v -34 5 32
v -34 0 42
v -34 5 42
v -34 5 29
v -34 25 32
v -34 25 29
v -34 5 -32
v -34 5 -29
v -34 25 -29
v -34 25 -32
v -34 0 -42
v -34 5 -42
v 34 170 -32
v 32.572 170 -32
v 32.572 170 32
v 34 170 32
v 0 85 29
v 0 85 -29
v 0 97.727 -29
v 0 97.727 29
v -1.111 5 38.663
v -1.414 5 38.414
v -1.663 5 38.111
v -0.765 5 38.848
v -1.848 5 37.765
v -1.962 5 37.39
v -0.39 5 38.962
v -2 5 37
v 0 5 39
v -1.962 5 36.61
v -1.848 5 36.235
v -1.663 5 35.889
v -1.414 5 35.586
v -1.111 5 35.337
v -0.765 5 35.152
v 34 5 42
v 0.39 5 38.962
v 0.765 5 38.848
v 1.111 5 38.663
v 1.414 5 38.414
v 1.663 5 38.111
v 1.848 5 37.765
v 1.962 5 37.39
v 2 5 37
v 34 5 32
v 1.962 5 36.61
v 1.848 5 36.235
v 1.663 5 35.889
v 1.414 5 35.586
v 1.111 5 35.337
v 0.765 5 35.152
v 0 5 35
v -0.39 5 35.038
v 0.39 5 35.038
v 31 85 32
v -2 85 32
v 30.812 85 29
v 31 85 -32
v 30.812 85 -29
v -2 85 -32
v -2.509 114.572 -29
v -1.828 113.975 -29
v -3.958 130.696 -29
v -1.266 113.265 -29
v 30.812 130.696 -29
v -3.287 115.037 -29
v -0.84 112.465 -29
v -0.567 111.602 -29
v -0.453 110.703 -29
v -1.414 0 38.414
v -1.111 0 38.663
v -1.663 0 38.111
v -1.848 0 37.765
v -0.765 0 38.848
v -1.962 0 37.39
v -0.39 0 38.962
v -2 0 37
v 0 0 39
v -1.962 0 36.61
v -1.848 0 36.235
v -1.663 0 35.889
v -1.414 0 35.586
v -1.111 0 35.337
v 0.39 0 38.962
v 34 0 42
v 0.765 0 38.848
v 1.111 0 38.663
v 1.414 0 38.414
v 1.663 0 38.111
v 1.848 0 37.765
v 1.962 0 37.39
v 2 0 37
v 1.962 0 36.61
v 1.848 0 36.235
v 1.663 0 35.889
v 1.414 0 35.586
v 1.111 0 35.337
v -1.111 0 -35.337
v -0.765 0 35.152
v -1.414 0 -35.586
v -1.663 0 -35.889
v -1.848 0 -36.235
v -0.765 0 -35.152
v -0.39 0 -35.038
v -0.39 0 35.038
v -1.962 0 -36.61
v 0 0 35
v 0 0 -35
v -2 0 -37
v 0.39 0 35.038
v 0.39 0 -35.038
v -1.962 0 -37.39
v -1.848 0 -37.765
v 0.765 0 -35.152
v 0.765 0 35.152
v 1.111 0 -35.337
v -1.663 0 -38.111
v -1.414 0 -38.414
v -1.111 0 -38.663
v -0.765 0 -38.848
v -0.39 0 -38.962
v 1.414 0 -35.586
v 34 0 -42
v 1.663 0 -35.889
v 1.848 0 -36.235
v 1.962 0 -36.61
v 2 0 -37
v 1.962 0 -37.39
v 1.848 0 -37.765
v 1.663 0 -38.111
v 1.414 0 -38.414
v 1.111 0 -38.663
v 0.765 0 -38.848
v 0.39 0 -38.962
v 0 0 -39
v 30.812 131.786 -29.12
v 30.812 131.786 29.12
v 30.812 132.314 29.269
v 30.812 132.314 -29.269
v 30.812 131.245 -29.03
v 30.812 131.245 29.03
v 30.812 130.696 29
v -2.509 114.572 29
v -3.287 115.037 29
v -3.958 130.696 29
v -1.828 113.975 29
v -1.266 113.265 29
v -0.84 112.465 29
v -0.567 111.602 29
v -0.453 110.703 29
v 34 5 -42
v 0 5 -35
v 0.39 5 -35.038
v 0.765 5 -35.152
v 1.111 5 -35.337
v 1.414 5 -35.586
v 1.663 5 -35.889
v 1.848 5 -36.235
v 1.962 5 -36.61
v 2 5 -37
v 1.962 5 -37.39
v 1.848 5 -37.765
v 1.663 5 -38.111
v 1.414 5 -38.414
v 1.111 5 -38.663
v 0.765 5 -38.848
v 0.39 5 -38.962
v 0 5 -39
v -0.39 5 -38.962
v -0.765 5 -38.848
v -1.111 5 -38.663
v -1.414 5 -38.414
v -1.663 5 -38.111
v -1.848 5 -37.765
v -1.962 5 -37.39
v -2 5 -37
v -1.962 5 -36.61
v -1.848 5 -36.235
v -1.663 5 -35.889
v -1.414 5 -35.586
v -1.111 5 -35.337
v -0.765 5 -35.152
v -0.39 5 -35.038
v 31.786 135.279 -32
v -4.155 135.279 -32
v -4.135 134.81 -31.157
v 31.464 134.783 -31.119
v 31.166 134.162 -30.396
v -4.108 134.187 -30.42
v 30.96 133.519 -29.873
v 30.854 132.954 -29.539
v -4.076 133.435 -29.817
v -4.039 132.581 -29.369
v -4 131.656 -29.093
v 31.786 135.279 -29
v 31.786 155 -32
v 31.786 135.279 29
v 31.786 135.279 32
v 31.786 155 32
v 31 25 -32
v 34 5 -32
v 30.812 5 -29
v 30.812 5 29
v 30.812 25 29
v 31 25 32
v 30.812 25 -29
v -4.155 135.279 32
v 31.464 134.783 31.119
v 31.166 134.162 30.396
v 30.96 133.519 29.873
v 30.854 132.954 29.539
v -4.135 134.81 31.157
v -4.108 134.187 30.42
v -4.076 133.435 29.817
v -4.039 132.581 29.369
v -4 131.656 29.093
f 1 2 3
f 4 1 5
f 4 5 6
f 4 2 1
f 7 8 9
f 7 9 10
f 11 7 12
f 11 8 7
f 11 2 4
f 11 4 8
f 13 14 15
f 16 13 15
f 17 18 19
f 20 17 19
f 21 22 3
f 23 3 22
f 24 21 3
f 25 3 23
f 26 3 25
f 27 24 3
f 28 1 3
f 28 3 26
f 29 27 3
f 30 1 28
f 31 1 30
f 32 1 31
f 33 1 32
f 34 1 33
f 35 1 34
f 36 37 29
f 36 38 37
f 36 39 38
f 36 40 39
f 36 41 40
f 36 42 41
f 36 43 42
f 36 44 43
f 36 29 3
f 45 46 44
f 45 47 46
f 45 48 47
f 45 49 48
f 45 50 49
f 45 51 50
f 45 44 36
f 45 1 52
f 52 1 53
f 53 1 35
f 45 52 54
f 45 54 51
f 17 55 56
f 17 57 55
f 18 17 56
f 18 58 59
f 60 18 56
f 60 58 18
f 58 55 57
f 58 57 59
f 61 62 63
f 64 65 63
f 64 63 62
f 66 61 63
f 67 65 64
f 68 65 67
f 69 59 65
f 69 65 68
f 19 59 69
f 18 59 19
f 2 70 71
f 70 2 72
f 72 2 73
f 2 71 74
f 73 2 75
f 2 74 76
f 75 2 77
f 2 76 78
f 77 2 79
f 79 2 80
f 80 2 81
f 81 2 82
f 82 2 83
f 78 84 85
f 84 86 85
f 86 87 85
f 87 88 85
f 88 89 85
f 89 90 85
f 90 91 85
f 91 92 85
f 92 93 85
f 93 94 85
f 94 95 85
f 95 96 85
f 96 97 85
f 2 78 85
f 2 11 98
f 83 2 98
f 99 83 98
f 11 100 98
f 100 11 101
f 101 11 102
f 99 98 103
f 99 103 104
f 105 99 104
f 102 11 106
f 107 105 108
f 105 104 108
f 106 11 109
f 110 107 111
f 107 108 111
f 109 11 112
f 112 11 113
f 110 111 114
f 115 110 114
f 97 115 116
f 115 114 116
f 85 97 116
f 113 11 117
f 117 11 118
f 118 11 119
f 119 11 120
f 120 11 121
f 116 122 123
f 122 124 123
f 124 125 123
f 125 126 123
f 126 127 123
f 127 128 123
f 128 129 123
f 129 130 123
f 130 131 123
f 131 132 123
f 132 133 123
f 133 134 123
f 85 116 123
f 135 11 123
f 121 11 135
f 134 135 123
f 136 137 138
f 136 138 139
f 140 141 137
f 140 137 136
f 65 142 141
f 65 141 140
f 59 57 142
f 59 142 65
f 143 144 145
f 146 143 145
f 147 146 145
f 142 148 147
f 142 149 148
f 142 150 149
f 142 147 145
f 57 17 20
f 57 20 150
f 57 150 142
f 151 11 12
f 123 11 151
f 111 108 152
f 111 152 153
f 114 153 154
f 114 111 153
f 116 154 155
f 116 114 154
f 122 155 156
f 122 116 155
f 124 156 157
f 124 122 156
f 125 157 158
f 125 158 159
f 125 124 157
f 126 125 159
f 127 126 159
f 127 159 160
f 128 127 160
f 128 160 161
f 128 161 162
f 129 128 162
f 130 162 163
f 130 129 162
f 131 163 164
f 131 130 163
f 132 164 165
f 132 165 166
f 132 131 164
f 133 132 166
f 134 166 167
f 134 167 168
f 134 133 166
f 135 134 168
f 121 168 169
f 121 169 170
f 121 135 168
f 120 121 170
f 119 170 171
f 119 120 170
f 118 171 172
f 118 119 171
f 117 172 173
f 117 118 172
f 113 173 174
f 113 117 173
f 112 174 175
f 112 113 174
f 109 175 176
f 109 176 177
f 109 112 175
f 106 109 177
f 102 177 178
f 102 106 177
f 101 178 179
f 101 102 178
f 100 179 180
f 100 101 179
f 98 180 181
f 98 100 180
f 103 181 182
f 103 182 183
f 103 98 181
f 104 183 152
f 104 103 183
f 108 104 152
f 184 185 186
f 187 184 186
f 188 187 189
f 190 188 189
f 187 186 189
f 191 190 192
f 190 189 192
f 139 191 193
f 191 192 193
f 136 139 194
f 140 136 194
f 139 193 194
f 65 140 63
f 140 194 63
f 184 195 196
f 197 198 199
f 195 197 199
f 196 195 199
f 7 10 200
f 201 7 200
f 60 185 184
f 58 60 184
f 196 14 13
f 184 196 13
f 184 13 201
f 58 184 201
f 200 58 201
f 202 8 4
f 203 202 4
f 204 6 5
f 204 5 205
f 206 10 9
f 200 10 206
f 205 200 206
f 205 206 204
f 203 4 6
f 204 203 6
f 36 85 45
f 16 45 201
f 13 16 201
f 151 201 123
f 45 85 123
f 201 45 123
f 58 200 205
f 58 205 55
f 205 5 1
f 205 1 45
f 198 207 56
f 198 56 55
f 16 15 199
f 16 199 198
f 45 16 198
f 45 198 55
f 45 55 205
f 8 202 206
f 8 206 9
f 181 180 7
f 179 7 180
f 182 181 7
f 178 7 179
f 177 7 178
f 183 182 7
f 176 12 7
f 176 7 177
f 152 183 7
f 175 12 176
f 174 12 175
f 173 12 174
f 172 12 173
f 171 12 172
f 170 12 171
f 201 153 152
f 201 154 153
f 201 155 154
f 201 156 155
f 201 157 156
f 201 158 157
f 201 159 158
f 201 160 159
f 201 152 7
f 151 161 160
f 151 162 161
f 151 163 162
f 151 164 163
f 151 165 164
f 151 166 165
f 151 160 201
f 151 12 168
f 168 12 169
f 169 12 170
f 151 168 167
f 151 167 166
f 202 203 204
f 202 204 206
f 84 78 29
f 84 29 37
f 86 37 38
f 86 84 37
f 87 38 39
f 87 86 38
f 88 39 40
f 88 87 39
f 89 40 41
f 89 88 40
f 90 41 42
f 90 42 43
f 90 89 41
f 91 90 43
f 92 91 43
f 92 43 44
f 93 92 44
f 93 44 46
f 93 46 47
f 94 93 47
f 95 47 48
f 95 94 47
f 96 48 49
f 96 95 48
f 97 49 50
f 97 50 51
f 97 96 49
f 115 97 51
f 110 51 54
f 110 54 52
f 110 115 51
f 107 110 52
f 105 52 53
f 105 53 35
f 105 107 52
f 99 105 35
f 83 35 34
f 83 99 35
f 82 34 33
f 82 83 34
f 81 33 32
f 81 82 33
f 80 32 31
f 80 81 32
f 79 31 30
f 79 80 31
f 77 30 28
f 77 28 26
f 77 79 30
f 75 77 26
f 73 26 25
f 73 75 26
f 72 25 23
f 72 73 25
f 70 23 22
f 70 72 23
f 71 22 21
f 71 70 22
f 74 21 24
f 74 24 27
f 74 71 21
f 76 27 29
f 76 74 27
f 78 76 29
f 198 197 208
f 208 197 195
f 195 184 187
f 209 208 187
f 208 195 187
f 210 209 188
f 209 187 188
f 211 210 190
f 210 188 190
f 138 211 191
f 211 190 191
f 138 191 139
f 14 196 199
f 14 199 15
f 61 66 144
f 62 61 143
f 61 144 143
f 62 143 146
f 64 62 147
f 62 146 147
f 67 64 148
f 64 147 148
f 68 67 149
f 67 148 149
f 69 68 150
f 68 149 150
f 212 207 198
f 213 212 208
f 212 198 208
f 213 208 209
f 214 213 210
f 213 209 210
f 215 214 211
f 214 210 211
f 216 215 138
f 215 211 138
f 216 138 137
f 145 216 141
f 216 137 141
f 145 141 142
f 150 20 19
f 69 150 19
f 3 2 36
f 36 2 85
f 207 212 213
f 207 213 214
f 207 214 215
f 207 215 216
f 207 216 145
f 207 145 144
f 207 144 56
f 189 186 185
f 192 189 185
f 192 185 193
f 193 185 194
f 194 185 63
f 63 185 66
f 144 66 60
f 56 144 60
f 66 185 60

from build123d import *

# Parameters (mm, degrees)
CROQUIS1_W              = 68
CROQUIS1_H              = 64
CROQUIS1_W_2            = 61.625
CROQUIS1_H_2            = 58
SALIENTE_EXTRUIR1_DEPTH = 25
SALIENTE_EXTRUIR2_DEPTH = 160
SALIENTE_EXTRUIR3_DEPTH = 61
SALIENTE_EXTRUIR5_DEPTH = 3
CROQUIS4_W              = 100
CROQUIS4_H              = 30
CORTAR_EXTRUIR1_DEPTH   = 83
CHAFL_N1_SIZE           = 2
CHAFL_N1_SIZE2          = 57.272506566
CROQUIS1_2_W            = 68
CROQUIS1_2_H            = 64
CROQUIS1_2_W_2          = 61.625
CROQUIS1_2_H_2          = 58
SALIENTE_EXTRUIR6_DEPTH = 5
CROQUIS5_W              = 40
CROQUIS5_H              = 60
CORTAR_EXTRUIR2_DEPTH   = 90
CROQUIS1_4_W            = 68
CROQUIS1_4_H            = 10
CROQUIS1_4_R            = 2
SALIENTE_EXTRUIR7_DEPTH = 5
CROQUIS6_W              = 75.447981844
CROQUIS6_H              = 15
CORTAR_EXTRUIR3_DEPTH   = 5
CHAFL_N2_SIZE           = 30
CHAFL_N2_SIZE_2         = 1.572233378
CHAFL_N3_SIZE           = 5
CHAFL_N3_SIZE2          = 0.881634904
CROQUIS7_W              = 58
CROQUIS7_H              = 20
CORTAR_EXTRUIR4_DEPTH   = 40
CROQUIS8_W              = 58
CROQUIS8_H              = 40
CORTAR_EXTRUIR5_DEPTH   = 10
REDONDEO2_R             = 5
CORTAR_EXTRUIR6_DEPTH   = 70
REDONDEO5_R             = 5


with BuildPart() as part:
    # Croquis1 → Saliente-Extruir1 (new body)
    with BuildSketch(Plane(origin=(0, 0, 0), x_dir=(1, 0, 0), z_dir=(0, 1, 0))):
        Rectangle(CROQUIS1_W, CROQUIS1_H)
        Rectangle(CROQUIS1_W_2, CROQUIS1_H_2, mode=Mode.SUBTRACT)
    extrude(amount=SALIENTE_EXTRUIR1_DEPTH)

    # Croquis2 → Saliente-Extruir2 (add)
    with BuildSketch(Plane(origin=(0, 25, 0), x_dir=(1, 0, 0), z_dir=(0, 1, 0))):
        Polygon((0, 29), (0, 32), (34, 32), (34, -32), (0, -32), (0, -29), (30.8125, -29), (30.8125, 29), align=None)
    extrude(amount=SALIENTE_EXTRUIR2_DEPTH)



with BuildPart() as body_2:
    # Croquis3 → Saliente-Extruir3 (new body)
    with BuildSketch(Plane(origin=(0, 0, 29), x_dir=(-1, 0, 0), z_dir=(0, 0, -1))):
        Polygon((0, 155), (5, 155), (2, 85), (0, 85), align=None)
    extrude(amount=SALIENTE_EXTRUIR3_DEPTH)


with BuildPart() as part_1:
    add(part.part)

    add(body_2.part)  # Saliente-Extruir5 merges body 2
    # Croquis3<4> → Saliente-Extruir5 (add)
    with BuildSketch(Plane(origin=(0, 0, 29), x_dir=(-1, 0, 0), z_dir=(0, 0, -1))):
        Polygon((0, 155), (5, 155), (2, 85), (0, 85), align=None)
    extrude(amount=-SALIENTE_EXTRUIR5_DEPTH)

    # Croquis4 → Cortar-Extruir1 (cut)
    with BuildSketch(Plane(origin=(0, 0, -32), x_dir=(-1, 0, 0), z_dir=(0, 0, -1))):
        with Locations((19, 170)):
            Rectangle(CROQUIS4_W, CROQUIS4_H)
    extrude(amount=-CORTAR_EXTRUIR1_DEPTH, mode=Mode.SUBTRACT)

    # Chaflán1
    chafl_n1_edges = [part_1.edges().sort_by_distance(p)[0] for p in [
        (0, 155, 0),
    ]]
    chafl_n1_side = [part_1.faces().sort_by_distance(p)[0] for p in [
        (13, 155, -31.26569761),
    ]]
    chamfer(chafl_n1_edges, length=CHAFL_N1_SIZE, length2=CHAFL_N1_SIZE2, reference=chafl_n1_side[0])

    # Croquis1<2> → Saliente-Extruir6 (add)
    # profile 1 of 2: a face of its own
    with BuildSketch(Plane(origin=(0, 0, 0), x_dir=(1, 0, 0), z_dir=(0, 1, 0))):
        Rectangle(CROQUIS1_2_W, CROQUIS1_2_H)
        Rectangle(CROQUIS1_2_W_2, CROQUIS1_2_H_2, mode=Mode.SUBTRACT)
    # profile 2 of 2: a face of its own
    with BuildSketch(Plane(origin=(0, 0, 0), x_dir=(1, 0, 0), z_dir=(0, 1, 0))):
        Rectangle(CROQUIS1_2_W_2, CROQUIS1_2_H_2)
    extrude(amount=SALIENTE_EXTRUIR6_DEPTH)

    # Croquis5 → Cortar-Extruir2 (cut)
    with BuildSketch(Plane(origin=(0, 0, -32), x_dir=(-1, 0, 0), z_dir=(0, 0, -1))):
        with Locations((-11, 55)):
            Rectangle(CROQUIS5_W, CROQUIS5_H)
    extrude(amount=-CORTAR_EXTRUIR2_DEPTH, mode=Mode.SUBTRACT)

    # Croquis1<4> → Saliente-Extruir7 (add)
    # profile 1 of 2: a face of its own
    with BuildSketch(Plane(origin=(0, 0, 0), x_dir=(1, 0, 0), z_dir=(0, 1, 0))):
        with Locations((0, 37)):
            Rectangle(CROQUIS1_4_W, CROQUIS1_4_H)
        with Locations(Location((0, 37, 0), (0, 0, 270))):
            Circle(CROQUIS1_4_R, mode=Mode.SUBTRACT)
    # profile 2 of 2: a face of its own
    with BuildSketch(Plane(origin=(0, 0, 0), x_dir=(1, 0, 0), z_dir=(0, 1, 0))):
        with Locations((0, -37)):
            Rectangle(CROQUIS1_4_W, CROQUIS1_4_H)
        with Locations(Location((0, -37, 0), (0, 0, 270))):
            Circle(CROQUIS1_4_R, mode=Mode.SUBTRACT)
    extrude(amount=SALIENTE_EXTRUIR7_DEPTH)

    # Croquis6 → Cortar-Extruir3 (cut)
    with BuildSketch(Plane.ZY.offset(-31)):
        with Locations((5.723990922, 177.5)):
            Rectangle(CROQUIS6_W, CROQUIS6_H)
    extrude(amount=-CORTAR_EXTRUIR3_DEPTH, mode=Mode.SUBTRACT)

    # Chaflán2
    # the kernel refuses this chamfer: 30, 1.572233378 mm, written as the material it takes off along each edge
    with BuildSketch(Plane(origin=(31, 170, -109.996046635), x_dir=(-0.002013023422382327, -0.9999979738662979, 0), z_dir=(0, 0, 1))) as chafl_n2_piece_1_section:
        Polygon((CHAFL_N2_SIZE * 0.999997973866, CHAFL_N2_SIZE * 0.00201302342238), (-CHAFL_N2_SIZE_2 * 0.00201302342301, CHAFL_N2_SIZE_2 * 0.999997974179), (0, 0), align=None)
    chafl_n2_piece_1 = extrude(amount=219.992093269, mode=Mode.PRIVATE)
    chafl_n2_piece_1 = split(chafl_n2_piece_1, bisect_by=Plane(origin=(31.611424092, 155, 0), z_dir=(0, 1, 0)), keep=Keep.TOP, mode=Mode.PRIVATE)
    add(chafl_n2_piece_1, mode=Mode.SUBTRACT)

    # Chaflán3
    chafl_n3_edges = [part_1.edges().sort_by_distance(p)[0] for p in [
        (30.8125, 155, 0),
    ]]
    chafl_n3_side = [part_1.faces().sort_by_distance(p)[0] for p in [
        (30.8125, 120, 0),
    ]]
    chamfer(chafl_n3_edges, length=CHAFL_N3_SIZE, length2=CHAFL_N3_SIZE2, reference=chafl_n3_side[0])

    # Croquis7 → Cortar-Extruir4 (cut)
    with BuildSketch(Plane.ZY.offset(34)):
        with Locations((0, 15)):
            Rectangle(CROQUIS7_W, CROQUIS7_H)
    extrude(amount=-CORTAR_EXTRUIR4_DEPTH, mode=Mode.SUBTRACT)

    # Croquis8 → Cortar-Extruir5 (cut)
    with BuildSketch(Plane(origin=(1.639845182, 0.070279079, 0), x_dir=(0, 0, 1), z_dir=(-0.9990828958176697, -0.04281783839218585, 0))):
        with Locations((0, 135.071938044)):
            Rectangle(CROQUIS8_W, CROQUIS8_H)
    extrude(amount=-CORTAR_EXTRUIR5_DEPTH, mode=Mode.SUBTRACT)

    # Redondeo2
    # the kernel refuses this fillet: 5 mm, written as the material it takes off along each edge
    with BuildSketch(Plane(origin=(-0.608459404, 115.151491041, 29), x_dir=(0.034899496702498145, -0.9993908270190959, 0), z_dir=(0, 0, -1))) as redondeo2_piece_1:
        with BuildLine():
            CenterArc((4.451052559, 5), REDONDEO2_R, 207.629976372, 62.370023628)
            Line((0.021247221, 2.681201893), (0, 0))
            Line((0, 0), (4.451052559, 0))
        make_face()
    extrude(amount=58, mode=Mode.SUBTRACT)

    # Croquis9 → Cortar-Extruir6 (cut)
    with BuildSketch(Plane.XY.offset(32)):
        Polygon((-5, 155), (-4.15481256, 135.278959735), (31.786116689, 135.278959735), (31.786116689, 137.80344281), (31.786116689, 155), (-4.263004692, 155), align=None)
    extrude(amount=-CORTAR_EXTRUIR6_DEPTH, mode=Mode.SUBTRACT)

    # Redondeo5
    # the kernel refuses this fillet: 5 mm, written as the material it takes off along each edge
    with BuildSketch(Plane(origin=(30.8125, 135.278959735, 29), x_dir=(0, 0, 1), z_dir=(-1, 0, 0))) as redondeo5_piece_1_section:
        with BuildLine():
            CenterArc((5, -4.582575695), REDONDEO5_R, 113.578178478, 66.421821522)
            Line((0, -4.582575695), (-0.1, -4.582575695))
            Line((-0.1, -4.582575695), (-0.1, 0))
            Line((-0.1, 0), (0, 0.1))
            ThreePointArc((0, 0.1), (1.5, 0.1), (2.96, 0.091651514))
            Line((2.96, 0.091651514), (3, 0))
        make_face()
    redondeo5_piece_1 = extrude(amount=46.423751797, mode=Mode.PRIVATE)
    redondeo5_piece_1 = split(redondeo5_piece_1, bisect_by=Plane(origin=(-4.075030571, 133.417379989, 29.7763393), z_dir=(0.9990828958176697, 0.042817838392185836, 0)), keep=Keep.TOP, mode=Mode.PRIVATE)
    add(redondeo5_piece_1, mode=Mode.SUBTRACT)
    with BuildSketch(Plane(origin=(-15.611251797, 135.278959735, -29), x_dir=(0, -1, 0), z_dir=(1, 0, 0))) as redondeo5_piece_2_section:
        with BuildLine():
            CenterArc((4.582575695, 5), REDONDEO5_R, 203.578178478, 66.421821522)
            Line((0, 3), (-0.091651514, 2.96))
            ThreePointArc((-0.091651514, 2.96), (-0.1, 1.5), (-0.1, 0))
            Line((-0.1, 0), (0, -0.1))
            Line((0, -0.1), (4.582575695, -0.1))
            Line((4.582575695, -0.1), (4.582575695, 0))
        make_face()
    redondeo5_piece_2 = extrude(amount=46.423751797, mode=Mode.PRIVATE)
    redondeo5_piece_2 = split(redondeo5_piece_2, bisect_by=Plane(origin=(-4.075030571, 133.417379989, -29.7763393), z_dir=(0.9990828958176697, 0.042817838392185836, 0)), keep=Keep.TOP, mode=Mode.PRIVATE)
    add(redondeo5_piece_2, mode=Mode.SUBTRACT)
    with BuildSketch(Plane(origin=(30.8125, 135.278959735, -29), x_dir=(1, 0, 0), z_dir=(0, 0, 1))) as redondeo5_piece_3:
        with BuildLine():
            CenterArc((5, -2.964496152), REDONDEO5_R, 143.636982553, 36.363017447)
            Line((0, -2.964496152), (-0.1, -2.964496152))
            Line((-0.1, -2.964496152), (-0.1, 0))
            Line((-0.1, 0), (0, 0.1))
            ThreePointArc((0, 0.1), (0.486808345, 0.1), (0.893089023, 0.059289923))
            Line((0.893089023, 0.059289923), (0.973616689, 0))
        make_face()
    extrude(amount=58, mode=Mode.SUBTRACT)
    with BuildSketch(Plane(origin=(30.8125, 135.278959735, -29), x_dir=(1, 0, 0), z_dir=(0, 0, 1))) as redondeo5_piece_4a_section:
        with BuildLine():
            CenterArc((5, -2.964496152), REDONDEO5_R, 143.636982553, 36.363017447)
            Line((0, -2.964496152), (-0.1, -2.964496152))
            Line((-0.1, -2.964496152), (-0.1, 0))
            Line((-0.1, 0), (0, 0.1))
            ThreePointArc((0, 0.1), (0.486808345, 0.1), (0.893089023, 0.059289923))
            Line((0.893089023, 0.059289923), (0.973616689, 0))
        make_face()
    redondeo5_piece_4a = extrude(amount=65.41124038, mode=Mode.PRIVATE)
    redondeo5_piece_4a = split(redondeo5_piece_4a, bisect_by=Plane(origin=(31.030991271, 134.436005592, 29), z_dir=(0, 0, 1)), keep=Keep.TOP, mode=Mode.PRIVATE)
    with BuildSketch(Plane(origin=(42.268939237, 135.278959735, 29), x_dir=(0, 0, 1), z_dir=(-1, 0, 0))) as redondeo5_piece_4b_section:
        with BuildLine():
            CenterArc((5, -4.582575695), REDONDEO5_R, 113.578178478, 66.421821522)
            Line((0, -4.582575695), (-0.1, -4.582575695))
            Line((-0.1, -4.582575695), (-0.1, 0))
            Line((-0.1, 0), (0, 0.1))
            ThreePointArc((0, 0.1), (1.5, 0.1), (2.96, 0.091651514))
            Line((2.96, 0.091651514), (3, 0))
        make_face()
    redondeo5_piece_4b = extrude(amount=57.880191035, mode=Mode.PRIVATE)
    redondeo5_piece_4b = split(redondeo5_piece_4b, bisect_by=Plane(origin=(30.8125, 134.163022014, 29.775816439), z_dir=(1, 0, 0)), keep=Keep.TOP, mode=Mode.PRIVATE)
    redondeo5_piece_4 = redondeo5_piece_4a & redondeo5_piece_4b
    add(redondeo5_piece_4, mode=Mode.SUBTRACT)
    with BuildSketch(Plane(origin=(-15.611251797, 135.278959735, -29), x_dir=(0, -1, 0), z_dir=(1, 0, 0))) as redondeo5_piece_5a_section:
        with BuildLine():
            CenterArc((4.582575695, 5), REDONDEO5_R, 203.578178478, 66.421821522)
            Line((0, 3), (-0.091651514, 2.96))
            ThreePointArc((-0.091651514, 2.96), (-0.1, 1.5), (-0.1, 0))
            Line((-0.1, 0), (0, -0.1))
            Line((0, -0.1), (4.582575695, -0.1))
            Line((4.582575695, -0.1), (4.582575695, 0))
        make_face()
    redondeo5_piece_5a = extrude(amount=57.880191035, mode=Mode.PRIVATE)
    redondeo5_piece_5a = split(redondeo5_piece_5a, bisect_by=Plane(origin=(30.8125, 134.163022014, -29.775816439), z_dir=(1, 0, 0)), keep=Keep.TOP, mode=Mode.PRIVATE)
    with BuildSketch(Plane(origin=(30.8125, 135.278959735, -36.41124038), x_dir=(1, 0, 0), z_dir=(0, 0, 1))) as redondeo5_piece_5b_section:
        with BuildLine():
            CenterArc((5, -2.964496152), REDONDEO5_R, 143.636982553, 36.363017447)
            Line((0, -2.964496152), (-0.1, -2.964496152))
            Line((-0.1, -2.964496152), (-0.1, 0))
            Line((-0.1, 0), (0, 0.1))
            ThreePointArc((0, 0.1), (0.486808345, 0.1), (0.893089023, 0.059289923))
            Line((0.893089023, 0.059289923), (0.973616689, 0))
        make_face()
    redondeo5_piece_5b = extrude(amount=65.41124038, mode=Mode.PRIVATE)
    redondeo5_piece_5b = split(redondeo5_piece_5b, bisect_by=Plane(origin=(31.030991271, 134.436005592, -29), z_dir=(0, 0, -1)), keep=Keep.TOP, mode=Mode.PRIVATE)
    redondeo5_piece_5 = redondeo5_piece_5a & redondeo5_piece_5b
    add(redondeo5_piece_5, mode=Mode.SUBTRACT)


solid = part_1.part
